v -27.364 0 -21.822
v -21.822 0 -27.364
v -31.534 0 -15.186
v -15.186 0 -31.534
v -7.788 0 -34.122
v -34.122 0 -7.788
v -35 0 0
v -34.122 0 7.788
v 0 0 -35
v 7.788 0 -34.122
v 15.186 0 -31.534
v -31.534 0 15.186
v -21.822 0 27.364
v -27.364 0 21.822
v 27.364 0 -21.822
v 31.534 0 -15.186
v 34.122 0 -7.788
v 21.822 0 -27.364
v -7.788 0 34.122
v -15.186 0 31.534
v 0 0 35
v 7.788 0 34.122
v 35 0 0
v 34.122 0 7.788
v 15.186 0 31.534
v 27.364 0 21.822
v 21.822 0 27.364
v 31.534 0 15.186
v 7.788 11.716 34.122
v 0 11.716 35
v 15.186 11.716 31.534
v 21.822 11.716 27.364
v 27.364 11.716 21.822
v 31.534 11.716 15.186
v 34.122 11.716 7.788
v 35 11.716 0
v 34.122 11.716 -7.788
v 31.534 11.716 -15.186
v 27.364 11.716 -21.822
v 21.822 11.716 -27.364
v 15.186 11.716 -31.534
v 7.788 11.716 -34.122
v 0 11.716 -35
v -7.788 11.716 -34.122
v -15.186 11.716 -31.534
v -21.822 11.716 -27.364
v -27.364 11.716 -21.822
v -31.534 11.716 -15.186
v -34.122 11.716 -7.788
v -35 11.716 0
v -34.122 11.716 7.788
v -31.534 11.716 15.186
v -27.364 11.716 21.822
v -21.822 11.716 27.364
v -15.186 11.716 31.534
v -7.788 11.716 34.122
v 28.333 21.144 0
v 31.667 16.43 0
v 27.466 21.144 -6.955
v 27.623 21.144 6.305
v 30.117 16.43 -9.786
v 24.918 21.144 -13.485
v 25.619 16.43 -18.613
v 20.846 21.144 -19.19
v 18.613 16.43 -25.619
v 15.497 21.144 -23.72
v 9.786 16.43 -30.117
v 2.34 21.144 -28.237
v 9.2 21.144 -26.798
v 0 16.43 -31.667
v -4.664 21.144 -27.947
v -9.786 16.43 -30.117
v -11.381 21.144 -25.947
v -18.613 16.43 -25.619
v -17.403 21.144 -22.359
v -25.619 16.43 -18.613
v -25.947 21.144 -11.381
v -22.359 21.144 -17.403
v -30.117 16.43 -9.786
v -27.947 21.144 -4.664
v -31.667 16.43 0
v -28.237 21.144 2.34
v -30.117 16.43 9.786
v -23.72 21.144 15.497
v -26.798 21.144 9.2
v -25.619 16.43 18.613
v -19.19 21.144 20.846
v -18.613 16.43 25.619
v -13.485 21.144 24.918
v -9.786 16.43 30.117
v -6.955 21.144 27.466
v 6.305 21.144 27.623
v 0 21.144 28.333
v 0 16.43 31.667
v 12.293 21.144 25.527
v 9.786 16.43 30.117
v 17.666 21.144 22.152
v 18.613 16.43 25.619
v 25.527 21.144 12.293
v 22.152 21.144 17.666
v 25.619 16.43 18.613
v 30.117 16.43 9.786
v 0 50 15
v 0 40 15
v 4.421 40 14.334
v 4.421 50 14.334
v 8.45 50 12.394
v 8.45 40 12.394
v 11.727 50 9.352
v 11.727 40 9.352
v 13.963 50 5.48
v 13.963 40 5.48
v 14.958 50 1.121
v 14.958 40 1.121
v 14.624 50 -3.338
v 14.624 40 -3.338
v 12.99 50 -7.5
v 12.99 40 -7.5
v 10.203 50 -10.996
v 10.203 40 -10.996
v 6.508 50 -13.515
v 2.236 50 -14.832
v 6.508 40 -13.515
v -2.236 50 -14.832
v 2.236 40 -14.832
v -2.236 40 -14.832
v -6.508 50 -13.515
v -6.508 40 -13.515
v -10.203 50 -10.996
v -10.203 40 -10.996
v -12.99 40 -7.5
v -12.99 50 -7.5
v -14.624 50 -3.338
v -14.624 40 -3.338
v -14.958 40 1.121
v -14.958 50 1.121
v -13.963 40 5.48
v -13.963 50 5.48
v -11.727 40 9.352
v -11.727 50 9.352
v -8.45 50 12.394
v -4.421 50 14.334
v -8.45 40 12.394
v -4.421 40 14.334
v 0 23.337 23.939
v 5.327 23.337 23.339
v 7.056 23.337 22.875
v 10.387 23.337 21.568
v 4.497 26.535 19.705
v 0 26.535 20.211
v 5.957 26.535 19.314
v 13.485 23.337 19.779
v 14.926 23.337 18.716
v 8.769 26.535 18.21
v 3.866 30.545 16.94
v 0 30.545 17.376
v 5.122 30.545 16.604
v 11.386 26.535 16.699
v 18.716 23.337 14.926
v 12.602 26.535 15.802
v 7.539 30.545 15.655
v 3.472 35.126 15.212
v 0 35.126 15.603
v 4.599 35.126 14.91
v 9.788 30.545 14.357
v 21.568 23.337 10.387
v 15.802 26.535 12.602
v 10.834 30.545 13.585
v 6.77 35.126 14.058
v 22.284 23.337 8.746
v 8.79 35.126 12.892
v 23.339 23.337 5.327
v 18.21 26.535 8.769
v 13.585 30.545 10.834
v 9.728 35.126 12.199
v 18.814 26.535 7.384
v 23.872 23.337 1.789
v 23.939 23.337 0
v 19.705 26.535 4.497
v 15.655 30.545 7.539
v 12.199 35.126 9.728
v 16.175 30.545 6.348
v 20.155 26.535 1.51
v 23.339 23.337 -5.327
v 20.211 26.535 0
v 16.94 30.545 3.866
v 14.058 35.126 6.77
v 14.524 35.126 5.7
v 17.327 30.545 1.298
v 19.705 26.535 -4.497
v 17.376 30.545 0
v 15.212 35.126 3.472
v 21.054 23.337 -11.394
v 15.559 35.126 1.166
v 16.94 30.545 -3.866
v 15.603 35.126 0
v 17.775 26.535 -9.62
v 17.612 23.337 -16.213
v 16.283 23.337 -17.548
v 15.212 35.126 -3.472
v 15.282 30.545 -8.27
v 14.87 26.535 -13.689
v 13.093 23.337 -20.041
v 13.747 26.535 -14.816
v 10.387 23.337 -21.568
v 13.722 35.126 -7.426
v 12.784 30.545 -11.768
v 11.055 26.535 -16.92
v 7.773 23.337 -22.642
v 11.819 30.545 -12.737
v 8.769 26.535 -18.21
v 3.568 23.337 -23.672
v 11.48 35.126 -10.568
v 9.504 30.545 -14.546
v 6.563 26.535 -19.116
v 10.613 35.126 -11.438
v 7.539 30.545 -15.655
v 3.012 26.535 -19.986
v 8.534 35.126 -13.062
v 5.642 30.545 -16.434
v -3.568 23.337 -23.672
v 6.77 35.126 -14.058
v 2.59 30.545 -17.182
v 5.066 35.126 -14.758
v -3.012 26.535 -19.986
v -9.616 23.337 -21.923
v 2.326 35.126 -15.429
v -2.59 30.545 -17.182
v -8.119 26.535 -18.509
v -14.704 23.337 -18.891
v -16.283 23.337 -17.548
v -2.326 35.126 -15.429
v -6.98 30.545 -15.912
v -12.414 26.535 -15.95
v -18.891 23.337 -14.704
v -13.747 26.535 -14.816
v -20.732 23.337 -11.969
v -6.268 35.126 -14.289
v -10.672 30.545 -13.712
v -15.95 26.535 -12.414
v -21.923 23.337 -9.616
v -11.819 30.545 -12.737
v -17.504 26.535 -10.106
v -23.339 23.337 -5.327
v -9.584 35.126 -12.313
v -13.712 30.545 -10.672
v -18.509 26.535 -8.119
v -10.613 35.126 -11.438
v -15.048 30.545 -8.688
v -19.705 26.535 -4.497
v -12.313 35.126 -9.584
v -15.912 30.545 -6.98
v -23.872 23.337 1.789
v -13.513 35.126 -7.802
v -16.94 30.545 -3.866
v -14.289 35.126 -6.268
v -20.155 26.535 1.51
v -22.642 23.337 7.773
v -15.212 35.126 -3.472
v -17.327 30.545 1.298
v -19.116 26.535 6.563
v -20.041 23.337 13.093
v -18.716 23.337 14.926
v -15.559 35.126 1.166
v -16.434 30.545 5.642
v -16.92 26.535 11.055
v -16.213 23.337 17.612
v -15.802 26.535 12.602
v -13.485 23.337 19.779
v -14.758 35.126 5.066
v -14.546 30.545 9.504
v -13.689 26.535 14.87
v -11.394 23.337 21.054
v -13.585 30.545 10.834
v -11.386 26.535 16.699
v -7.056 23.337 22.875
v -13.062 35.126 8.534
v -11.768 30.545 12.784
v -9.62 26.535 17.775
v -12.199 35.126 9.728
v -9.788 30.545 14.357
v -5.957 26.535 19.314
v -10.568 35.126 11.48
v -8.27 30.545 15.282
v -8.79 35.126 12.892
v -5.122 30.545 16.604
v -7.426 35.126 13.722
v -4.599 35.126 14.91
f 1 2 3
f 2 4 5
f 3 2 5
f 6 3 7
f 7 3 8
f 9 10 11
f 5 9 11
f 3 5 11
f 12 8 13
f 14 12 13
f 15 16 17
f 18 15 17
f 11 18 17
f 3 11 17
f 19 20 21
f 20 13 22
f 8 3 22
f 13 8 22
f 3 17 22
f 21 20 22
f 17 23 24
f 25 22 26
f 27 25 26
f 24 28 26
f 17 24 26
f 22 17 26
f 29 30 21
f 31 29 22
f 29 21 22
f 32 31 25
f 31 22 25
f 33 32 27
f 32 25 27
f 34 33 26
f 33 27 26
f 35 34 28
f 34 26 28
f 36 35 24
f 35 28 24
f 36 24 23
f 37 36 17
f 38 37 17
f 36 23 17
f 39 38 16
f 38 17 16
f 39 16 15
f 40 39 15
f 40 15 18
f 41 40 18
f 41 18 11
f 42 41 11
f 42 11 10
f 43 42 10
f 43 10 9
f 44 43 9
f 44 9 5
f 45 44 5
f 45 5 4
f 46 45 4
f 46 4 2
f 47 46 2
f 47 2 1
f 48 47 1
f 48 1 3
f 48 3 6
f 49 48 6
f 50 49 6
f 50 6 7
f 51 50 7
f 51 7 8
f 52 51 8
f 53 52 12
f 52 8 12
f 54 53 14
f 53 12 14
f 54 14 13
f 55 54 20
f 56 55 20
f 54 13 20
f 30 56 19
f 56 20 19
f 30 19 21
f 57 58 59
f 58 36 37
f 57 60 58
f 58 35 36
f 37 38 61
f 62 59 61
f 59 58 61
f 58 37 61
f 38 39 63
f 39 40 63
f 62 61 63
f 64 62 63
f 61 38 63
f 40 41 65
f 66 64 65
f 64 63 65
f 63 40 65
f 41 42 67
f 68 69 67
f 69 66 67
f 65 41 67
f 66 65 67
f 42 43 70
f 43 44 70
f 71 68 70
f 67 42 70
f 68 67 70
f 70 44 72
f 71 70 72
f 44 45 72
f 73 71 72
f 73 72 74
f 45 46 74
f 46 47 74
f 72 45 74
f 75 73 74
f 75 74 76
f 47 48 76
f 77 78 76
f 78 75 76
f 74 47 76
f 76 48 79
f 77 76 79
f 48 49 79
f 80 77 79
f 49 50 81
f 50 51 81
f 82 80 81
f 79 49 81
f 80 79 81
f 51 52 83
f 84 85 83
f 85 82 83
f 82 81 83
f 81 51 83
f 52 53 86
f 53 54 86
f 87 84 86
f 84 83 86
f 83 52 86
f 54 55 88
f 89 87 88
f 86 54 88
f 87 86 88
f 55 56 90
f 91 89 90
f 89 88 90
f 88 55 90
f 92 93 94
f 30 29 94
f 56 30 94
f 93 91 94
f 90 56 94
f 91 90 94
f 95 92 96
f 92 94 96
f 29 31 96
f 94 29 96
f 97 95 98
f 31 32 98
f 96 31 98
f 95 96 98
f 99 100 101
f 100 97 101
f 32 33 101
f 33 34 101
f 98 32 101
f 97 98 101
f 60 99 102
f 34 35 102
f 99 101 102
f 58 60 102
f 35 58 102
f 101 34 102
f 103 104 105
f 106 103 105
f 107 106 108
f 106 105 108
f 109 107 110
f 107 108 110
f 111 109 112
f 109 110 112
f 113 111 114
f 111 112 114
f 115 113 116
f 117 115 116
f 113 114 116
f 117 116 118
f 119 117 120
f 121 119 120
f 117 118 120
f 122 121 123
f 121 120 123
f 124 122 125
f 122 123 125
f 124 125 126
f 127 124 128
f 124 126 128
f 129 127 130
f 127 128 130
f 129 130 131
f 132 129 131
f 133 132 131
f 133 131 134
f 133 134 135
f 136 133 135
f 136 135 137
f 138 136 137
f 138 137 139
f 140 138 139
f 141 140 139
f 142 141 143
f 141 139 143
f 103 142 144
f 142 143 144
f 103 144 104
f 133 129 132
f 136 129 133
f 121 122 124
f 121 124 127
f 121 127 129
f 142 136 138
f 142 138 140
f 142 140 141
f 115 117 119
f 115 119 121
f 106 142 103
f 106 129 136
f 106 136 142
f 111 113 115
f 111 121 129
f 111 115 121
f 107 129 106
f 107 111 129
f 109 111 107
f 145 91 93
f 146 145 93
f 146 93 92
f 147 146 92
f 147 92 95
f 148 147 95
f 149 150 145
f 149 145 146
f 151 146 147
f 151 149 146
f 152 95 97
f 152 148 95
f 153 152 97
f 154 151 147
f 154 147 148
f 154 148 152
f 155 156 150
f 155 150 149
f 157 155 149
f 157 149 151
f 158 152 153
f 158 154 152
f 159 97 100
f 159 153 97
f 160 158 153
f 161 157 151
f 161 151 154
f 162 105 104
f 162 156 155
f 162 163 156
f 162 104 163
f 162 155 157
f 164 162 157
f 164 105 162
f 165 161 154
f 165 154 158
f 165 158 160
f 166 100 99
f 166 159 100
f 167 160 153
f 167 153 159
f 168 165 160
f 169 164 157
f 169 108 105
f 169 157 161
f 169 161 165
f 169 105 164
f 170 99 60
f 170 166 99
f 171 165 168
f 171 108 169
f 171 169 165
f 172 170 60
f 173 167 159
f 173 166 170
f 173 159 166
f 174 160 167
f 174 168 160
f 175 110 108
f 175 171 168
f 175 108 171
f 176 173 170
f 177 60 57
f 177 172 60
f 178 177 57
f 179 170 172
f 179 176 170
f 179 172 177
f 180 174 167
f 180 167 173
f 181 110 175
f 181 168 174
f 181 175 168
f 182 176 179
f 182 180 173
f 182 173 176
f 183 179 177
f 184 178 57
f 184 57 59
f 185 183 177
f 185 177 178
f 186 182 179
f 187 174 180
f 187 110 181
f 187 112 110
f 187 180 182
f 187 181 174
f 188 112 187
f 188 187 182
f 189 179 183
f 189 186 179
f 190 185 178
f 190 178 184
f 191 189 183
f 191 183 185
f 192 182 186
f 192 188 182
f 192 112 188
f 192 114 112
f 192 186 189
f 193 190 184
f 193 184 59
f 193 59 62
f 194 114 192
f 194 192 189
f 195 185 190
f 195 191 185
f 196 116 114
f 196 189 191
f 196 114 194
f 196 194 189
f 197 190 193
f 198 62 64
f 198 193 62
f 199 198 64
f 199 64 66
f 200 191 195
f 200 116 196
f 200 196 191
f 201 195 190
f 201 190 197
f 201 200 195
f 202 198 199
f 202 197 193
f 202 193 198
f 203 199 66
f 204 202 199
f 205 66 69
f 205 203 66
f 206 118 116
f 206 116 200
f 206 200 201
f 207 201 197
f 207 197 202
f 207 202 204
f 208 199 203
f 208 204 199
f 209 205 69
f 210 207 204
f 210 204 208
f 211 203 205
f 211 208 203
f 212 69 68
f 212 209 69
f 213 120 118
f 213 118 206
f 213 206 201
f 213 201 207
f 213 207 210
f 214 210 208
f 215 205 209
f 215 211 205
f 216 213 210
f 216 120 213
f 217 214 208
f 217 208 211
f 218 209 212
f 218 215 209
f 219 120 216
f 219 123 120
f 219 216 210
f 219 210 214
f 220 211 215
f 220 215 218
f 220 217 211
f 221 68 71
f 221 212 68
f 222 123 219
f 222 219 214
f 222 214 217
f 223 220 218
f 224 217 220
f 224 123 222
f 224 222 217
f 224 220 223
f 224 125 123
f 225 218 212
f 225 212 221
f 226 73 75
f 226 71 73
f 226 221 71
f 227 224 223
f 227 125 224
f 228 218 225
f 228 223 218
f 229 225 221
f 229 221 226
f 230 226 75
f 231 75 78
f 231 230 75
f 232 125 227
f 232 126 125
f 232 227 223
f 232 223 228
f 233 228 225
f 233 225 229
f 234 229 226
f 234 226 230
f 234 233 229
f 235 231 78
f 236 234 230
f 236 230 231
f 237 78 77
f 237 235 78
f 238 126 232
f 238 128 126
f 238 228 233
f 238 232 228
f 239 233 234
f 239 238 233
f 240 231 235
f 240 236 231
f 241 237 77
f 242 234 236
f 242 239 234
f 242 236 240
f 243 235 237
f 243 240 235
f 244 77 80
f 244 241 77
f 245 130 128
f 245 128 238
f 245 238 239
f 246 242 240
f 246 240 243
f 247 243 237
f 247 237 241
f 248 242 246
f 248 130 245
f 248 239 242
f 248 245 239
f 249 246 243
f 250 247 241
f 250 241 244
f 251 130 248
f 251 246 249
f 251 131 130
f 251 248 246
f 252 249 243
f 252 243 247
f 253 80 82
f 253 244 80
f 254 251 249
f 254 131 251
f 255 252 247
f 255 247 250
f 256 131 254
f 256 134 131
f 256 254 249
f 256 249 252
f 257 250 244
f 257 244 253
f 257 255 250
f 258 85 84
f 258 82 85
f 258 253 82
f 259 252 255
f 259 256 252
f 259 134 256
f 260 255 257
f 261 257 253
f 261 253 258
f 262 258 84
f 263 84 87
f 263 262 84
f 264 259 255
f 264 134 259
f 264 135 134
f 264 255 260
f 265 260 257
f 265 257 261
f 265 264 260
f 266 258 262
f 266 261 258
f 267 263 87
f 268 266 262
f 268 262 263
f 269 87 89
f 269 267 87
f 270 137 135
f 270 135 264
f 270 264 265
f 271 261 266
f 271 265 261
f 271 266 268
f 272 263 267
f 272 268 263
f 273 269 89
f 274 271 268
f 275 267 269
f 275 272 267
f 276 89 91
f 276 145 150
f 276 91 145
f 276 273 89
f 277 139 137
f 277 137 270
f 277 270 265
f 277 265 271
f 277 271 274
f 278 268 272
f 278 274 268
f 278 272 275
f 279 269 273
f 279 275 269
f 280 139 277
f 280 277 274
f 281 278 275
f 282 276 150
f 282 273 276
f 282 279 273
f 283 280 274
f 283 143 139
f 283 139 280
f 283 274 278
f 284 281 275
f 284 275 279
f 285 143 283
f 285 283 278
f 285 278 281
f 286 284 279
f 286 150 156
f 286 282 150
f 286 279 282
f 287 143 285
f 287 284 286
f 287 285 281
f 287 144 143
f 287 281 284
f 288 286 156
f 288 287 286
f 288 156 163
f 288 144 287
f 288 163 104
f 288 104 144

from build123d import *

# Parameters (mm, degrees)
SCHIZZO1_R                   = 35
ESTRUSIONE_ESTRUSIONE1_DEPTH = 20
SCHIZZO2_R                   = 15
ESTRUSIONE_ESTRUSIONE2_DEPTH = 30
RACCORDO1_R                  = 20


with BuildPart() as part:
    # Schizzo1 → Estrusione-Estrusione1 (new body)
    with BuildSketch(Plane(origin=(0, 0, 0), x_dir=(1, 0, 0), z_dir=(0, 1, 0))):
        with Locations(Location((0, 0, 0), (0, 0, 270))):
            Circle(SCHIZZO1_R)
    extrude(amount=ESTRUSIONE_ESTRUSIONE1_DEPTH)

    # Schizzo2 → Estrusione-Estrusione2 (add)
    with BuildSketch(Plane(origin=(0, 20, 0), x_dir=(1, 0, 0), z_dir=(0, 1, 0))):
        with Locations(Location((0, 0, 0), (0, 0, 270))):
            Circle(SCHIZZO2_R)
    extrude(amount=ESTRUSIONE_ESTRUSIONE2_DEPTH)

    # Raccordo1
    raccordo1_edges = [part.edges().sort_by_distance(p)[0] for p in [
        (0, 20, -15),
    ]]
    fillet(raccordo1_edges, radius=RACCORDO1_R - 0.0001)  # a hair under: the kernel refuses the full size

    # Smusso1: read off the stored shape, not the designer's step
    # Smusso1 outline → Smusso1 (revolve, cut)
    with BuildSketch(Plane.XY):
        Polygon((35, 21.143819168), (28.333333333, 21.143819168), (35, 11.715728753), align=None)
    revolve(axis=Axis((0, 0, 0), (0, 1, 0)), mode=Mode.SUBTRACT)


solid = part.part
